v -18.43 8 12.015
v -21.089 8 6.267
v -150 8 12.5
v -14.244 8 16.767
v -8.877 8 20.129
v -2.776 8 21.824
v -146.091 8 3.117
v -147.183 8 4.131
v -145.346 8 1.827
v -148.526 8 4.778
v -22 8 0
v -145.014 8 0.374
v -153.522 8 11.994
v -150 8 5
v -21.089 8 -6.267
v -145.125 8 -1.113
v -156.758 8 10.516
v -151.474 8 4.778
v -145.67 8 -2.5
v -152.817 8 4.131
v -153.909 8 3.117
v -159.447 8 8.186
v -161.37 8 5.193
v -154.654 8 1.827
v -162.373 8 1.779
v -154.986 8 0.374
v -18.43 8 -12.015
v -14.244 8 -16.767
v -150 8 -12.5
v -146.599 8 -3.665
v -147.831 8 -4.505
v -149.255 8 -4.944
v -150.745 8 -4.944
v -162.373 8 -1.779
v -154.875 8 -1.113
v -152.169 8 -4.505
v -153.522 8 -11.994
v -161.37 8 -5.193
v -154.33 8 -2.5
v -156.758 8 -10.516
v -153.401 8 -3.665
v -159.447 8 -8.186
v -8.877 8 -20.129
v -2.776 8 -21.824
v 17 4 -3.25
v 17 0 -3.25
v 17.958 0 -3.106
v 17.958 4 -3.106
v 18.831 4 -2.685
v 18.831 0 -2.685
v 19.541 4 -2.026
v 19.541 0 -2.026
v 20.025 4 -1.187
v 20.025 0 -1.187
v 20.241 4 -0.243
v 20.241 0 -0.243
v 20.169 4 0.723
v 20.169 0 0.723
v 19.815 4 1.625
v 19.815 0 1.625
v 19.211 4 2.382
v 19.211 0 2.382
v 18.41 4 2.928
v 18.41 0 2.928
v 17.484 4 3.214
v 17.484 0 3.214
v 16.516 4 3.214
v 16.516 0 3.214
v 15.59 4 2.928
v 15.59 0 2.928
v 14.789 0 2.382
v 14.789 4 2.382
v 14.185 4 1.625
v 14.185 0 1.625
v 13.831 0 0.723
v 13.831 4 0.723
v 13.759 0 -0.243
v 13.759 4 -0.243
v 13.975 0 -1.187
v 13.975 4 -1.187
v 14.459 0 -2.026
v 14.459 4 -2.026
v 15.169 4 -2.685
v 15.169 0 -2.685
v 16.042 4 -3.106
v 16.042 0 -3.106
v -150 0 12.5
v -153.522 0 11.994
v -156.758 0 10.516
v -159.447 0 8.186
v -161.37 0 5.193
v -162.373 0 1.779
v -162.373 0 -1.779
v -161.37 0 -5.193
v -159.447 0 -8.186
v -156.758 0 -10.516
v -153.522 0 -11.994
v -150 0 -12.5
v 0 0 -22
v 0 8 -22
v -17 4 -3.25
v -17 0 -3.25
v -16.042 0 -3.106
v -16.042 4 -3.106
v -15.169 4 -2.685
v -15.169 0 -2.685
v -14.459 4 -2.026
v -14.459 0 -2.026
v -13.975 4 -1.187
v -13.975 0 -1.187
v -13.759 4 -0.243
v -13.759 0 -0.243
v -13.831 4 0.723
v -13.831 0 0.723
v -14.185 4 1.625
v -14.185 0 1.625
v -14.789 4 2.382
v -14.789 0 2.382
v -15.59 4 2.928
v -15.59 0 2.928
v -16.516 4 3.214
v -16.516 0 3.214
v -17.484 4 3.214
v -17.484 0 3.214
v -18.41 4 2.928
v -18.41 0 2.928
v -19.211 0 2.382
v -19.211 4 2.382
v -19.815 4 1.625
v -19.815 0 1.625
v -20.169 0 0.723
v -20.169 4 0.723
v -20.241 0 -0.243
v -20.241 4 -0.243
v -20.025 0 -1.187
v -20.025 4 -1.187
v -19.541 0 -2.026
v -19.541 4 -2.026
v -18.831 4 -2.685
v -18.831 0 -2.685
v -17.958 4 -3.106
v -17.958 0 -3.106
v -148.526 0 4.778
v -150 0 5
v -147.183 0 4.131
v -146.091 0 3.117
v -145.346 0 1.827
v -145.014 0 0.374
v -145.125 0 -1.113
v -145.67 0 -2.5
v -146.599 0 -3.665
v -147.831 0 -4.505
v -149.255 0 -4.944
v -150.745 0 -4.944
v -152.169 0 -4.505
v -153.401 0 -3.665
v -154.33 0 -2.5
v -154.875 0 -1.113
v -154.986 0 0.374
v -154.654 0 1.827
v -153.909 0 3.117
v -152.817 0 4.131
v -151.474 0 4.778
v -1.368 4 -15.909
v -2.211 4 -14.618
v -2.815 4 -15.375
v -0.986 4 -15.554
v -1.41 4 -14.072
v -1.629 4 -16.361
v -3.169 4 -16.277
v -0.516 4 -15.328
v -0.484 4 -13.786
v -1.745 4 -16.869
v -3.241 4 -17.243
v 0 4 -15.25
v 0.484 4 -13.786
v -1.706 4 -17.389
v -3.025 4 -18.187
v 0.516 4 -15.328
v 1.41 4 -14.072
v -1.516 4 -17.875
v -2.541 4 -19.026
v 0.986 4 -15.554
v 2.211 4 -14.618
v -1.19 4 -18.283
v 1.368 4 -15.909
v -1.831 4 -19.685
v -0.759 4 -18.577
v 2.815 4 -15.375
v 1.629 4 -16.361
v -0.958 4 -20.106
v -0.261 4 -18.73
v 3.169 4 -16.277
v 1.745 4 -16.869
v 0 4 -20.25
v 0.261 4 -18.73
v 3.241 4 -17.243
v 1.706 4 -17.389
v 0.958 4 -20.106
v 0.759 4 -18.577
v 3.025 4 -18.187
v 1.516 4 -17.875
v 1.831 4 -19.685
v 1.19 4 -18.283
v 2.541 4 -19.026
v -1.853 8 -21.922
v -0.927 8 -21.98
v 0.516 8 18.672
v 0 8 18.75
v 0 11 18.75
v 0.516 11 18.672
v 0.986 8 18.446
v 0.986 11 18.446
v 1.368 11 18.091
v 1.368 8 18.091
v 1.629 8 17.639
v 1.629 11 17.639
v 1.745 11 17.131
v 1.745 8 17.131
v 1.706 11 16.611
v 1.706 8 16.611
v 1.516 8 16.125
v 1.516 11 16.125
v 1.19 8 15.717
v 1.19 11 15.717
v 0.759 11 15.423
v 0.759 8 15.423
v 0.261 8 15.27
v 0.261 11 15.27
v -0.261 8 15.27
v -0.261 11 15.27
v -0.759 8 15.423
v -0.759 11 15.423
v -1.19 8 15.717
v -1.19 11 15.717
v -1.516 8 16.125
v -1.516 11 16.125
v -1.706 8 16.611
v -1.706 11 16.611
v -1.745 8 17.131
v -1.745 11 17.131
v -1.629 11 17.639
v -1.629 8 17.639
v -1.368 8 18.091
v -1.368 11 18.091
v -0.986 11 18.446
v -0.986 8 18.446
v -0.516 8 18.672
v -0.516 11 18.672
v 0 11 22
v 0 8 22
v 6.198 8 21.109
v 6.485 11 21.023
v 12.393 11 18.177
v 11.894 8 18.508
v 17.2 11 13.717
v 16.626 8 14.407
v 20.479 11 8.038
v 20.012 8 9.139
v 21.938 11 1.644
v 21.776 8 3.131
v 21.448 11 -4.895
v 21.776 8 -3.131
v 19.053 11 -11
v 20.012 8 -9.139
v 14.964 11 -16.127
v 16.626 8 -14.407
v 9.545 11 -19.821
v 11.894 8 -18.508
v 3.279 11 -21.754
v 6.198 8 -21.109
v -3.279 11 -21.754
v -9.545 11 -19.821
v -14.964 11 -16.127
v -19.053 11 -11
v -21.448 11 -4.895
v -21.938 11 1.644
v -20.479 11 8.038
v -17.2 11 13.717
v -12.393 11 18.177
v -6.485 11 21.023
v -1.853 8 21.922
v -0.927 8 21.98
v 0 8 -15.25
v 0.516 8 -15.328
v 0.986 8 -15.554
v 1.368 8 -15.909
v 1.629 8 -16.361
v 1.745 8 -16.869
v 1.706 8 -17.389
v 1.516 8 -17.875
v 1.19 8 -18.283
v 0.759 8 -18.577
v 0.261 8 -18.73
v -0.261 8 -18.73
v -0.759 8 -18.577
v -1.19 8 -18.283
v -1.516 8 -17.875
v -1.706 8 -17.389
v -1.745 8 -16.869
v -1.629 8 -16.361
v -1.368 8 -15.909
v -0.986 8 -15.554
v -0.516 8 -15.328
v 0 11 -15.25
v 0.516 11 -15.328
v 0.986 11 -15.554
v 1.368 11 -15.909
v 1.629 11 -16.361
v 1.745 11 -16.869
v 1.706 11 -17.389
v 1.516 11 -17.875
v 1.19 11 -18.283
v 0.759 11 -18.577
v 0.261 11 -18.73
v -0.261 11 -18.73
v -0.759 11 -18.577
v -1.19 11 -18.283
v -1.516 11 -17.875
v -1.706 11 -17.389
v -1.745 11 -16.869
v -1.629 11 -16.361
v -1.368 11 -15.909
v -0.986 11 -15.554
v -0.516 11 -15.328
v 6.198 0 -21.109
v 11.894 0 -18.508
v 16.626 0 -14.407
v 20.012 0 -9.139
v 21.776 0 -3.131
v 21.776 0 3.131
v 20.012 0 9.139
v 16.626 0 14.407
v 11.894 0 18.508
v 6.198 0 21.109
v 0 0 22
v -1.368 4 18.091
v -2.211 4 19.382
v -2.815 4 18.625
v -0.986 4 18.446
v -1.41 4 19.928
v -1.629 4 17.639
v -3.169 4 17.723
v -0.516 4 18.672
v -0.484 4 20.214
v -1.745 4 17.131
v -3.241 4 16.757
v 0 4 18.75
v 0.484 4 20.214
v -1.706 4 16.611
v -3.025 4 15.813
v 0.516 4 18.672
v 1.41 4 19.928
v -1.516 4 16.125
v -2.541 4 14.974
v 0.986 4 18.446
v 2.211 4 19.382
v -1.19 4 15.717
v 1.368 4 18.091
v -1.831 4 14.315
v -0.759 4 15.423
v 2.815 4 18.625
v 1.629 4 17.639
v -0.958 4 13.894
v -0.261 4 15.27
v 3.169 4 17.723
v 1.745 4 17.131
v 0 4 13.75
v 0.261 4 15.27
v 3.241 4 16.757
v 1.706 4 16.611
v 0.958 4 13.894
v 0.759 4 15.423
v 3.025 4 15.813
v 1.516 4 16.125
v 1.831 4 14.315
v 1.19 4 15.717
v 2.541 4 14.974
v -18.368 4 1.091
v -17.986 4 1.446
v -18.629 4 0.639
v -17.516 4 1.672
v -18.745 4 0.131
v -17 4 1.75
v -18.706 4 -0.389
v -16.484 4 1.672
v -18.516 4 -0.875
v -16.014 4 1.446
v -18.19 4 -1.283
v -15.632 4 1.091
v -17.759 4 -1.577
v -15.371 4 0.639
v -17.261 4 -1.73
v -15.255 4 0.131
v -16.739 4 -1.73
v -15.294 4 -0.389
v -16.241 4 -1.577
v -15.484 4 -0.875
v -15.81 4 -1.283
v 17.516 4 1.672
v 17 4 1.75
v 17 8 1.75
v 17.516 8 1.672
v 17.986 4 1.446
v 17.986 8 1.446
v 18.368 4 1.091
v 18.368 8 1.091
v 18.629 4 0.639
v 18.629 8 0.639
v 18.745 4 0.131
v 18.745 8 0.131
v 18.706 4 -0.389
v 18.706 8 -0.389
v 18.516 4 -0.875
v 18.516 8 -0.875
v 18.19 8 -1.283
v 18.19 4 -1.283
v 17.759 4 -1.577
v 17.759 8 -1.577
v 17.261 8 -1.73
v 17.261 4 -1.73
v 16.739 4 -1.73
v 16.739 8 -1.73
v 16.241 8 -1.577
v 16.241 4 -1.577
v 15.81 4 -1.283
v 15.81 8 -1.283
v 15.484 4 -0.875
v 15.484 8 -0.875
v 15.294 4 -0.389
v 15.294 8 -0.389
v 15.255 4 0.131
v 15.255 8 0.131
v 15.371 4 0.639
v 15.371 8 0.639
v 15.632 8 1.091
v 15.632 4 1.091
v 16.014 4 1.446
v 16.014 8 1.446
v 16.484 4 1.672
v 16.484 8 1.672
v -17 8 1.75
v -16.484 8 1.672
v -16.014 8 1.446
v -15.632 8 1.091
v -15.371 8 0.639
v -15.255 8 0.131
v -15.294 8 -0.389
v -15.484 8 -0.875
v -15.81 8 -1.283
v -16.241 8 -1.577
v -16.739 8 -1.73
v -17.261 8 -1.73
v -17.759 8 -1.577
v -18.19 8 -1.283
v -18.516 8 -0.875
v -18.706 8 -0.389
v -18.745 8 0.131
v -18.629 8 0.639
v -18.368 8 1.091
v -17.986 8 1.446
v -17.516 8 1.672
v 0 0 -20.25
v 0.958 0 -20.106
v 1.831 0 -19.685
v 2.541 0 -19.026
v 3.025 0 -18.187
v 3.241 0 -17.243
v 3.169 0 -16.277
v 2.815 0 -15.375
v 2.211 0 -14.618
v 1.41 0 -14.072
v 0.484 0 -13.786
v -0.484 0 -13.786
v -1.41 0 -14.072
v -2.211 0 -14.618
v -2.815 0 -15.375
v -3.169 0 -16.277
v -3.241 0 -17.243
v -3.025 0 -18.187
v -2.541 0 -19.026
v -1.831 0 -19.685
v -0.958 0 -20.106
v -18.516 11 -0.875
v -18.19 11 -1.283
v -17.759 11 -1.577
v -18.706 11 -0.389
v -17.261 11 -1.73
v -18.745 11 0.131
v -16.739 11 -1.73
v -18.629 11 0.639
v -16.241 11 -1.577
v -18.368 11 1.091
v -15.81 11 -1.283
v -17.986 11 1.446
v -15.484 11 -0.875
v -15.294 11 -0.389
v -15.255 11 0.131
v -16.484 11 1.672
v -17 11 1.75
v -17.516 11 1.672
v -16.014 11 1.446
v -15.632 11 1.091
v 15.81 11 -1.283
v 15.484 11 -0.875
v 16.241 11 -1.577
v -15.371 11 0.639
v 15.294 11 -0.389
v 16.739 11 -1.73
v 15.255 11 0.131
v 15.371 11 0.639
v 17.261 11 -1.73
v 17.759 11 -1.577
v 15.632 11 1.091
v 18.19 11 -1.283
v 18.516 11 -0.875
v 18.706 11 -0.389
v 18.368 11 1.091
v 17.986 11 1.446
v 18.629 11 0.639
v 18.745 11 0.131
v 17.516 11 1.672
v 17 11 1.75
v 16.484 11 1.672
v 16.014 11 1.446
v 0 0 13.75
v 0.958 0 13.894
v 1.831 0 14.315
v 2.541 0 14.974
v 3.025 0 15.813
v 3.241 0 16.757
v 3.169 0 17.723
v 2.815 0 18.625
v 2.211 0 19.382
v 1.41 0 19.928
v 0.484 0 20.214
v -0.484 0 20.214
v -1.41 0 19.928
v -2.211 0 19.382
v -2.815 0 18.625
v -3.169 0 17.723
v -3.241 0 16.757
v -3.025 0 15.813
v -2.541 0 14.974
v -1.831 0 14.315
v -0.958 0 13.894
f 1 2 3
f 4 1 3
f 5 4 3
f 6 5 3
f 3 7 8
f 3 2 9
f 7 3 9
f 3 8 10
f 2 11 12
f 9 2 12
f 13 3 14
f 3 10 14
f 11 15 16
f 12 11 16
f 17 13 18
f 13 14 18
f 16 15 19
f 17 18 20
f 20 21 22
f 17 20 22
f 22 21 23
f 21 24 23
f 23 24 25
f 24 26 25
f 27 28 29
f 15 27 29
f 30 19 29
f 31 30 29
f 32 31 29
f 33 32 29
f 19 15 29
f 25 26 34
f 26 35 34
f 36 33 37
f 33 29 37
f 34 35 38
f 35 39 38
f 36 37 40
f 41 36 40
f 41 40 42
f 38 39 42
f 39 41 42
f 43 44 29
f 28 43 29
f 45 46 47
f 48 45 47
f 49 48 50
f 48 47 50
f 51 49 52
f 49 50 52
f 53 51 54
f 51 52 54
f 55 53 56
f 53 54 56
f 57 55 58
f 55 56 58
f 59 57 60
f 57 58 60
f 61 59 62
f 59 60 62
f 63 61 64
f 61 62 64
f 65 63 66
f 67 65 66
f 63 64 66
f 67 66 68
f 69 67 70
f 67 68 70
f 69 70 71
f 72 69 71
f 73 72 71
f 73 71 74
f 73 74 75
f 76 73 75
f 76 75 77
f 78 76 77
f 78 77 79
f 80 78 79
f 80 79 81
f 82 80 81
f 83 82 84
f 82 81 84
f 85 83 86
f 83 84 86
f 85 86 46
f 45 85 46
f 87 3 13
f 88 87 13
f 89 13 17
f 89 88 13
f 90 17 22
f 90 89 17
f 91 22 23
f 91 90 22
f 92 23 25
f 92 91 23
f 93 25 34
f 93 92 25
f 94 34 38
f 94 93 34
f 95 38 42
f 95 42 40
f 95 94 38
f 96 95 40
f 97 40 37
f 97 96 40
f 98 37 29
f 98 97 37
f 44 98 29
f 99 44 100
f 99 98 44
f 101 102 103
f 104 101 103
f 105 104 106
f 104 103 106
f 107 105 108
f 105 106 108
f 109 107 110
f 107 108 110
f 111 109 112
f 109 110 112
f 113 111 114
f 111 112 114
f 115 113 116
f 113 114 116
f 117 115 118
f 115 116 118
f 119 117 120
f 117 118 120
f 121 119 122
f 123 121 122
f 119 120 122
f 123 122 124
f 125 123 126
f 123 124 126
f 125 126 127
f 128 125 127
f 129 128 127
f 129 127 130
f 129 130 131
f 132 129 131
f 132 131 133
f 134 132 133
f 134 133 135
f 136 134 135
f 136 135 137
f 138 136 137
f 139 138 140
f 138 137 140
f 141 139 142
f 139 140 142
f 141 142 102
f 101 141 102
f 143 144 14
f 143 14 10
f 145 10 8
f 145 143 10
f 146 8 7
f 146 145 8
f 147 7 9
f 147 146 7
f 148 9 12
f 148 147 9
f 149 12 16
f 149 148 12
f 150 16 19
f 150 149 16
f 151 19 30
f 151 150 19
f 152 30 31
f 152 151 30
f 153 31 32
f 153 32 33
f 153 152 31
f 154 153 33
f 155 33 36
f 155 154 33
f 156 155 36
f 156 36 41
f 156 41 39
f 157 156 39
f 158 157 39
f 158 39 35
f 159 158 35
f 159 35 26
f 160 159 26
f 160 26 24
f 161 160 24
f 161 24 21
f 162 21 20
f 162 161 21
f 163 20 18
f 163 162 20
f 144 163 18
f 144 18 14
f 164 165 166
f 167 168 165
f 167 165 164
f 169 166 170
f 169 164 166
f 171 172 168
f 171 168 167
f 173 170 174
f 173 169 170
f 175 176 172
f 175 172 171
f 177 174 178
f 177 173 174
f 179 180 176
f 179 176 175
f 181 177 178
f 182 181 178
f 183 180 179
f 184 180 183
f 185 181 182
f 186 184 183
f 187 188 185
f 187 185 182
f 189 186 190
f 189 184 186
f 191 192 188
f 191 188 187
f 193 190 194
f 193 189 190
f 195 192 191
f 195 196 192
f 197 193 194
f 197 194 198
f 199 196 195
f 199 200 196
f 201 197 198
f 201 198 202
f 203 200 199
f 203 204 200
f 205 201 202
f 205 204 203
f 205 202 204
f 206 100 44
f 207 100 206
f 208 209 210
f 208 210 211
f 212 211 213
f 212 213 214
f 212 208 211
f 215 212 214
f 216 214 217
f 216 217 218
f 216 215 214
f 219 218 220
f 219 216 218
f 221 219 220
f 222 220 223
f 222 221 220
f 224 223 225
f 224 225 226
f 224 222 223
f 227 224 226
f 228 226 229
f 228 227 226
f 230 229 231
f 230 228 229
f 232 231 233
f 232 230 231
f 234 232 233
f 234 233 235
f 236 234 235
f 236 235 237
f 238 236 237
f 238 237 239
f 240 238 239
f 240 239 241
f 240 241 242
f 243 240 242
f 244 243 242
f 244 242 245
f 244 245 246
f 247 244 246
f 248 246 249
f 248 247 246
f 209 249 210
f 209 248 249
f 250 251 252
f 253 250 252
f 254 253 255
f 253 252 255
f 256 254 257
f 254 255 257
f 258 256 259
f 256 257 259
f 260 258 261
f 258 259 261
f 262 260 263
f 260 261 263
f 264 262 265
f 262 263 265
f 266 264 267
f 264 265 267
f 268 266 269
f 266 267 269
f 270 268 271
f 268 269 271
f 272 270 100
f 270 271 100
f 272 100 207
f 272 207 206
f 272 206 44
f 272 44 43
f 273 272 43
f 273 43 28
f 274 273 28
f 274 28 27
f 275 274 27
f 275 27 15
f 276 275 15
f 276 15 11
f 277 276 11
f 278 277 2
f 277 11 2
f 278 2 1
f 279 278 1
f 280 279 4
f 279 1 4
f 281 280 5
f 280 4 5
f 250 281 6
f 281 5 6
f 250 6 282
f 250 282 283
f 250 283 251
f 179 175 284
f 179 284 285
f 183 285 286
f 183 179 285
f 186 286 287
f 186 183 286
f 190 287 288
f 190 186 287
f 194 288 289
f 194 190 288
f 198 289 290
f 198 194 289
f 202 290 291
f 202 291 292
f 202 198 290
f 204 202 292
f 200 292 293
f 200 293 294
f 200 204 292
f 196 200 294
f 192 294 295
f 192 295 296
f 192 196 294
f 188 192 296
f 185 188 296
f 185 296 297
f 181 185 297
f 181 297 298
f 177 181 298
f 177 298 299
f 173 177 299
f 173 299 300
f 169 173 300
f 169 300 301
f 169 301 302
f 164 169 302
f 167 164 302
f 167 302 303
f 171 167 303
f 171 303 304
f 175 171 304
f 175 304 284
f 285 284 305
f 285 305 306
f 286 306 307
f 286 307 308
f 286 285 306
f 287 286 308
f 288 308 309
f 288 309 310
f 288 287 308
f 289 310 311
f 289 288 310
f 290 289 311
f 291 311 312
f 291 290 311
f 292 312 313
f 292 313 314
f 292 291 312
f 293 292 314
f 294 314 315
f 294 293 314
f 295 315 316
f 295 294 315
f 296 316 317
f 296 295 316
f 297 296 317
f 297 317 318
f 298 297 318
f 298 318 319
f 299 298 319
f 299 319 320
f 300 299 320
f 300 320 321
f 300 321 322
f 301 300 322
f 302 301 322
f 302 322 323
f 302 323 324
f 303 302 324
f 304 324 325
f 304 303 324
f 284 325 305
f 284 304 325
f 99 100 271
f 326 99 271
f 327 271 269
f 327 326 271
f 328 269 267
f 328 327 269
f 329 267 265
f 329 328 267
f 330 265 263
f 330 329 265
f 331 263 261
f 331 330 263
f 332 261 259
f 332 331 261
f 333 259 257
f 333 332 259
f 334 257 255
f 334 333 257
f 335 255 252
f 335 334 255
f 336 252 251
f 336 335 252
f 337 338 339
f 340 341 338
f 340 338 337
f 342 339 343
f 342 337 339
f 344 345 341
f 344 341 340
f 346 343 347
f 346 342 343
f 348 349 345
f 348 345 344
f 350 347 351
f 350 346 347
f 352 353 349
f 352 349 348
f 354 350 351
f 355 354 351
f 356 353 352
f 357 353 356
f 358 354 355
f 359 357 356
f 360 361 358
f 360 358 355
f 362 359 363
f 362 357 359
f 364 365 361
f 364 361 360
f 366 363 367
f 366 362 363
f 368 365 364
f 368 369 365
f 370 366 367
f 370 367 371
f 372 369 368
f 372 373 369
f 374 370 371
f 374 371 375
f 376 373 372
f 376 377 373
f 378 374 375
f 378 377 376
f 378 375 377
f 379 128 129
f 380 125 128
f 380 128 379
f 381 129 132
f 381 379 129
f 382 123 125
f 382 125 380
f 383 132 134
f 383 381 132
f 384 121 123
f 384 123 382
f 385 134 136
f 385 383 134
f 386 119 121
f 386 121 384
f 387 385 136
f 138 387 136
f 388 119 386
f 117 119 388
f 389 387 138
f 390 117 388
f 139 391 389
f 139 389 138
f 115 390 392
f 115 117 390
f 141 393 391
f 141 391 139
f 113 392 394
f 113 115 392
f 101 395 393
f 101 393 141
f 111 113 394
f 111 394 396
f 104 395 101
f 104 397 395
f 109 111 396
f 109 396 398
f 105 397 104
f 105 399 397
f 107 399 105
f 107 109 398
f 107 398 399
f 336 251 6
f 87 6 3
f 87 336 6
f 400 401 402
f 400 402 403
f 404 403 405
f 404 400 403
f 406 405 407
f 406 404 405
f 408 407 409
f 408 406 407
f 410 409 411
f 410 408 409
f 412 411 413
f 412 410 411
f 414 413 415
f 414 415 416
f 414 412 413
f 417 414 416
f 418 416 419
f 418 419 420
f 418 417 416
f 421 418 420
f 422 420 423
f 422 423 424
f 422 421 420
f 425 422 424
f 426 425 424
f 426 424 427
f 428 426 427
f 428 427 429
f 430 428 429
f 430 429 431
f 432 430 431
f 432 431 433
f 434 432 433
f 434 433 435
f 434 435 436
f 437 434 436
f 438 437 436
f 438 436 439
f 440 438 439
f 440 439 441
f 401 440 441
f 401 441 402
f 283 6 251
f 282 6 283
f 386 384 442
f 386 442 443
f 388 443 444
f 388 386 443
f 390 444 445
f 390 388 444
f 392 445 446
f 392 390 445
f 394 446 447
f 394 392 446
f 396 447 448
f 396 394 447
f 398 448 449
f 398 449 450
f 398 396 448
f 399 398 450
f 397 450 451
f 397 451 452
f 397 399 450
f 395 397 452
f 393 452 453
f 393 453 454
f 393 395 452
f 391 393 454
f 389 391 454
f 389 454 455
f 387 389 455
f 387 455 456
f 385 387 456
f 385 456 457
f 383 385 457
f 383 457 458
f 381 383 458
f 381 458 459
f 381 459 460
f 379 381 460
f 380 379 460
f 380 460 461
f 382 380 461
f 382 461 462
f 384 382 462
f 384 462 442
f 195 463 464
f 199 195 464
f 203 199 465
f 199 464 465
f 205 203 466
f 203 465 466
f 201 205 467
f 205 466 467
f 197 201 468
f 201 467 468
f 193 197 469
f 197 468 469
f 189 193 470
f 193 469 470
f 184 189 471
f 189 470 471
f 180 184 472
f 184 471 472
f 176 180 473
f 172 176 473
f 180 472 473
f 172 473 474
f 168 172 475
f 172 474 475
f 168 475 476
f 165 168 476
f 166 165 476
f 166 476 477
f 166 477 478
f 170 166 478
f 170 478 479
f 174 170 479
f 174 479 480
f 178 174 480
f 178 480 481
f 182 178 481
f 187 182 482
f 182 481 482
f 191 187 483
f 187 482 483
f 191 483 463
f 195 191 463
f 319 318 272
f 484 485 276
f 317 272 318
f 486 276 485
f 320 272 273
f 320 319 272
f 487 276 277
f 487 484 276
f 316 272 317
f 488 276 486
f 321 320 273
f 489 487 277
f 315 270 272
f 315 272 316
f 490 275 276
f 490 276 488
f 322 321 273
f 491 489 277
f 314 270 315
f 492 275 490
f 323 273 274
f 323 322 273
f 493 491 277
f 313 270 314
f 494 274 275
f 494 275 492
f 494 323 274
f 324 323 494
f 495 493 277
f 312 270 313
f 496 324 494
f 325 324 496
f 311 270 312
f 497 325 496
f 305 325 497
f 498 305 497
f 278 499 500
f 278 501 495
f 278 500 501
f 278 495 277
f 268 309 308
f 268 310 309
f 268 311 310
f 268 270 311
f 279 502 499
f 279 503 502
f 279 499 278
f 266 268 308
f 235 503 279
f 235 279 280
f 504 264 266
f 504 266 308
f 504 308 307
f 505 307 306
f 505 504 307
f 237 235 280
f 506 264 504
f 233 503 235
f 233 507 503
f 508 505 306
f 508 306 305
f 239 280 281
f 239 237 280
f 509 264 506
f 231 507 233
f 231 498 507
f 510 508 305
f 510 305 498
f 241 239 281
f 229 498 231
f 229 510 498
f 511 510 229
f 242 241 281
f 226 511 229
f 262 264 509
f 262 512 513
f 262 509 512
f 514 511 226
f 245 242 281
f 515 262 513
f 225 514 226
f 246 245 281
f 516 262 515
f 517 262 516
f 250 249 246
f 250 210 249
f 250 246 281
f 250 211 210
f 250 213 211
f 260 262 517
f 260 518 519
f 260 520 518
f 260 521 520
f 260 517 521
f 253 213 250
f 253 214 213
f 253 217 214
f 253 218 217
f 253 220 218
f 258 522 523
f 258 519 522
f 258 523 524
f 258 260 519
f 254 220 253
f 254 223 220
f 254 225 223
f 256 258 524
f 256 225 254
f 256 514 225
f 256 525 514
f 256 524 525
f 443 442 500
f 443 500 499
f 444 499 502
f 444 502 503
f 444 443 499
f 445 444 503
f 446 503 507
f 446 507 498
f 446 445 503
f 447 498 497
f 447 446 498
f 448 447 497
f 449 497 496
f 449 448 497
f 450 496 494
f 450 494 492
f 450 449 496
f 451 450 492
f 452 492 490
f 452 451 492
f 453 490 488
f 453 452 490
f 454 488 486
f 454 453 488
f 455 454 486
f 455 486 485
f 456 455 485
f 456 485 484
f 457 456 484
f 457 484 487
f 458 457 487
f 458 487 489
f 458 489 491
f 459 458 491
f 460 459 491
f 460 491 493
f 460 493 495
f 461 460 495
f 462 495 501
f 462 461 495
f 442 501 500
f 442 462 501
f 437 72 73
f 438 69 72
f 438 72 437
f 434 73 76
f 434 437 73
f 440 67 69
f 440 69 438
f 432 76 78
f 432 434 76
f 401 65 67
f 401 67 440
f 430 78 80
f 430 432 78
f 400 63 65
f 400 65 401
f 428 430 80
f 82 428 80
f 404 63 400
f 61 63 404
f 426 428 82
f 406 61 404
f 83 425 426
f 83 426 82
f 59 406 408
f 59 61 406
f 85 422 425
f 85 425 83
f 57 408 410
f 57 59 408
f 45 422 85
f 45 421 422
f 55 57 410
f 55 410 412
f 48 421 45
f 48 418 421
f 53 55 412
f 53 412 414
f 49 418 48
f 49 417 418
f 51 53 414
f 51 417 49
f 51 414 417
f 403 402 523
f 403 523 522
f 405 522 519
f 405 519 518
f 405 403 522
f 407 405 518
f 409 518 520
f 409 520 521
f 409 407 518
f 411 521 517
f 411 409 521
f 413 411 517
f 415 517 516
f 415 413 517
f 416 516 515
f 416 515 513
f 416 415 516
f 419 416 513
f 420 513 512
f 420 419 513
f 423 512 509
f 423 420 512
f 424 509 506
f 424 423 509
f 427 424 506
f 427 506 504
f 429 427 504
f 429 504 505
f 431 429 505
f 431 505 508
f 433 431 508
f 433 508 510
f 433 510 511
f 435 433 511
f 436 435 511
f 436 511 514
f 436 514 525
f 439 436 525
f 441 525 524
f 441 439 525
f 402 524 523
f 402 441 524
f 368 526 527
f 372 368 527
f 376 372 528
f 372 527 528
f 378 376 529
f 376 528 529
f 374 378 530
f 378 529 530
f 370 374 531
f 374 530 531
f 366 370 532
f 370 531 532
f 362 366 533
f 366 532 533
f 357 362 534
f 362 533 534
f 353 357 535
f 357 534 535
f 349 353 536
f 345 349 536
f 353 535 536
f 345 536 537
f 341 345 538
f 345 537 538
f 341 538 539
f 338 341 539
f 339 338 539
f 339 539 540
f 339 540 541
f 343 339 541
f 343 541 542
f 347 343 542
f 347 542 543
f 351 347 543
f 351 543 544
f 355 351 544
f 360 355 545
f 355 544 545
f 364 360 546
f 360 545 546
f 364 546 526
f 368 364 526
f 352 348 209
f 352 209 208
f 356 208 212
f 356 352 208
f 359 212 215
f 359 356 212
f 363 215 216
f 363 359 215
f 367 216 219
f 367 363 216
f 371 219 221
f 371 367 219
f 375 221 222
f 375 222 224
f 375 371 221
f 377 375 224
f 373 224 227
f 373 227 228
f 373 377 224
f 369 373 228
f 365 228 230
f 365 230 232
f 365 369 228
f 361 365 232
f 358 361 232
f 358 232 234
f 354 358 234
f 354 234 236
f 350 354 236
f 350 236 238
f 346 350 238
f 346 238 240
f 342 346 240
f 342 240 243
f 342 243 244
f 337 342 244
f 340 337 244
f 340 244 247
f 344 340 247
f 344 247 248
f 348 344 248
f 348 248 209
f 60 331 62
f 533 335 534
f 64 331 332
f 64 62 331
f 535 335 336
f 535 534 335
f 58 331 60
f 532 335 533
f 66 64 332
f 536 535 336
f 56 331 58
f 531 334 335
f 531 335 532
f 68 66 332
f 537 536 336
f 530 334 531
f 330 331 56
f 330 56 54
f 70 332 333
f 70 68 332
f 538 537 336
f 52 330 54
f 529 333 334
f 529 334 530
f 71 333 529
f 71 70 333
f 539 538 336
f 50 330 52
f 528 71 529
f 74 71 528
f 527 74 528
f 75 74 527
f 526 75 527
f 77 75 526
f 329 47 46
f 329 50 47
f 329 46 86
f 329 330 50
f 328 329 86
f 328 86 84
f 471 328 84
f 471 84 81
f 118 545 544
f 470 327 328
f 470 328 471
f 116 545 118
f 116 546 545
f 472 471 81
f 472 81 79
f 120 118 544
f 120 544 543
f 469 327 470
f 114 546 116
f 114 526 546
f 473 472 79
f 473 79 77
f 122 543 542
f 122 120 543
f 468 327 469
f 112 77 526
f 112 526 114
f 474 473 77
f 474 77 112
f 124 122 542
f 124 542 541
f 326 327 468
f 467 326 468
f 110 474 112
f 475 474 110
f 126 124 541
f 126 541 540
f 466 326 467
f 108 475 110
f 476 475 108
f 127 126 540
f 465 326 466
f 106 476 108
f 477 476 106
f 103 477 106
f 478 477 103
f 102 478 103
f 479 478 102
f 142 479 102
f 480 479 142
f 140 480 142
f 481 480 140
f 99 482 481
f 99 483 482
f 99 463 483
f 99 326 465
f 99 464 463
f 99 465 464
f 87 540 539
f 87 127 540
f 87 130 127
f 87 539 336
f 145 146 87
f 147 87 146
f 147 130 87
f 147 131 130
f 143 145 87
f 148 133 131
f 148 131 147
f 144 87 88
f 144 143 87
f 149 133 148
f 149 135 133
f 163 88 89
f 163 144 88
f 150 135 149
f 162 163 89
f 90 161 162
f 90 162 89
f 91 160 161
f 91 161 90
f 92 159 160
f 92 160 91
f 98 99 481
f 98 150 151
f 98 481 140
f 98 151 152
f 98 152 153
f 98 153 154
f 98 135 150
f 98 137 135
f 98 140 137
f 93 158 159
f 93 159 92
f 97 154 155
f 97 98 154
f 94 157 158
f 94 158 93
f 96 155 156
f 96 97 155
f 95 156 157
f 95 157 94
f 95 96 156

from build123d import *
from build123d.topology import SkipClean

# Parameters (mm, degrees)
SKETCH1_R           = 1.75
SKETCH1_R_2         = 5
BOSS_EXTRUDE1_DEPTH = 8
SKETCH2_R           = 22
SKETCH2_R_2         = 1.75
BOSS_EXTRUDE2_DEPTH = 3
SKETCH3_R           = 3.25
SKETCH3_R_2         = 1.75
CUT_EXTRUDE1_DEPTH  = 4


with BuildPart() as part:
    # Sketch1 → Boss-Extrude1 (new body)
    with BuildSketch(Plane(origin=(0, 0, 0), x_dir=(1, 0, 0), z_dir=(0, 1, 0))):
        with BuildLine():
            Line((-150, 12.5), (0, 22))
            ThreePointArc((0, 22), (22, 0), (0, -22))
            Line((0, -22), (-150, -12.5))
            ThreePointArc((-150, -12.5), (-162.5, 0), (-150, 12.5))
        make_face()
        with Locations((0, 17)):
            Circle(SKETCH1_R, mode=Mode.SUBTRACT)
        with Locations((17, 0)):
            Circle(SKETCH1_R, mode=Mode.SUBTRACT)
        with Locations((0, -17)):
            Circle(SKETCH1_R, mode=Mode.SUBTRACT)
        with Locations((-17, 0)):
            Circle(SKETCH1_R, mode=Mode.SUBTRACT)
        with Locations((-150, 0)):
            Circle(SKETCH1_R_2, mode=Mode.SUBTRACT)
    extrude(amount=BOSS_EXTRUDE1_DEPTH)

    # Sketch2 → Boss-Extrude2 (add)
    with SkipClean():  # the faces are left unmerged after this step: merging them gives an invalid solid
        with BuildSketch(Plane(origin=(0, 8, 0), x_dir=(1, 0, 0), z_dir=(0, 1, 0))):
            Circle(SKETCH2_R)
            with Locations((-17, 0)):
                Circle(SKETCH2_R_2, mode=Mode.SUBTRACT)
            with Locations((0, -17)):
                Circle(SKETCH2_R_2, mode=Mode.SUBTRACT)
            with Locations((17, 0)):
                Circle(SKETCH2_R_2, mode=Mode.SUBTRACT)
            with Locations((0, 17)):
                Circle(SKETCH2_R_2, mode=Mode.SUBTRACT)
        extrude(amount=BOSS_EXTRUDE2_DEPTH)
    add(part.part.scale(1), mode=Mode.REPLACE)  # the faces are merged on a copy

    # Sketch3 → Cut-Extrude1 (cut)
    # profile 1 of 4: a face of its own
    with BuildSketch(Plane(origin=(0, 0, 0), x_dir=(-1, 0, 0), z_dir=(0, -1, 0))):
        with Locations((0, 17)):
            Circle(SKETCH3_R)
        with Locations((0, 17)):
            Circle(SKETCH3_R_2, mode=Mode.SUBTRACT)
    # profile 2 of 4: a face of its own
    with BuildSketch(Plane(origin=(0, 0, 0), x_dir=(-1, 0, 0), z_dir=(0, -1, 0))):
        with Locations((-17, 0)):
            Circle(SKETCH3_R)
        with Locations((-17, 0)):
            Circle(SKETCH3_R_2, mode=Mode.SUBTRACT)
    # profile 3 of 4: a face of its own
    with BuildSketch(Plane(origin=(0, 0, 0), x_dir=(-1, 0, 0), z_dir=(0, -1, 0))):
        with Locations((0, -17)):
            Circle(SKETCH3_R)
        with Locations((0, -17)):
            Circle(SKETCH3_R_2, mode=Mode.SUBTRACT)
    # profile 4 of 4: a face of its own
    with BuildSketch(Plane(origin=(0, 0, 0), x_dir=(-1, 0, 0), z_dir=(0, -1, 0))):
        with Locations((17, 0)):
            Circle(SKETCH3_R)
        with Locations((17, 0)):
            Circle(SKETCH3_R_2, mode=Mode.SUBTRACT)
    extrude(amount=-CUT_EXTRUDE1_DEPTH, mode=Mode.SUBTRACT)


solid = part.part
